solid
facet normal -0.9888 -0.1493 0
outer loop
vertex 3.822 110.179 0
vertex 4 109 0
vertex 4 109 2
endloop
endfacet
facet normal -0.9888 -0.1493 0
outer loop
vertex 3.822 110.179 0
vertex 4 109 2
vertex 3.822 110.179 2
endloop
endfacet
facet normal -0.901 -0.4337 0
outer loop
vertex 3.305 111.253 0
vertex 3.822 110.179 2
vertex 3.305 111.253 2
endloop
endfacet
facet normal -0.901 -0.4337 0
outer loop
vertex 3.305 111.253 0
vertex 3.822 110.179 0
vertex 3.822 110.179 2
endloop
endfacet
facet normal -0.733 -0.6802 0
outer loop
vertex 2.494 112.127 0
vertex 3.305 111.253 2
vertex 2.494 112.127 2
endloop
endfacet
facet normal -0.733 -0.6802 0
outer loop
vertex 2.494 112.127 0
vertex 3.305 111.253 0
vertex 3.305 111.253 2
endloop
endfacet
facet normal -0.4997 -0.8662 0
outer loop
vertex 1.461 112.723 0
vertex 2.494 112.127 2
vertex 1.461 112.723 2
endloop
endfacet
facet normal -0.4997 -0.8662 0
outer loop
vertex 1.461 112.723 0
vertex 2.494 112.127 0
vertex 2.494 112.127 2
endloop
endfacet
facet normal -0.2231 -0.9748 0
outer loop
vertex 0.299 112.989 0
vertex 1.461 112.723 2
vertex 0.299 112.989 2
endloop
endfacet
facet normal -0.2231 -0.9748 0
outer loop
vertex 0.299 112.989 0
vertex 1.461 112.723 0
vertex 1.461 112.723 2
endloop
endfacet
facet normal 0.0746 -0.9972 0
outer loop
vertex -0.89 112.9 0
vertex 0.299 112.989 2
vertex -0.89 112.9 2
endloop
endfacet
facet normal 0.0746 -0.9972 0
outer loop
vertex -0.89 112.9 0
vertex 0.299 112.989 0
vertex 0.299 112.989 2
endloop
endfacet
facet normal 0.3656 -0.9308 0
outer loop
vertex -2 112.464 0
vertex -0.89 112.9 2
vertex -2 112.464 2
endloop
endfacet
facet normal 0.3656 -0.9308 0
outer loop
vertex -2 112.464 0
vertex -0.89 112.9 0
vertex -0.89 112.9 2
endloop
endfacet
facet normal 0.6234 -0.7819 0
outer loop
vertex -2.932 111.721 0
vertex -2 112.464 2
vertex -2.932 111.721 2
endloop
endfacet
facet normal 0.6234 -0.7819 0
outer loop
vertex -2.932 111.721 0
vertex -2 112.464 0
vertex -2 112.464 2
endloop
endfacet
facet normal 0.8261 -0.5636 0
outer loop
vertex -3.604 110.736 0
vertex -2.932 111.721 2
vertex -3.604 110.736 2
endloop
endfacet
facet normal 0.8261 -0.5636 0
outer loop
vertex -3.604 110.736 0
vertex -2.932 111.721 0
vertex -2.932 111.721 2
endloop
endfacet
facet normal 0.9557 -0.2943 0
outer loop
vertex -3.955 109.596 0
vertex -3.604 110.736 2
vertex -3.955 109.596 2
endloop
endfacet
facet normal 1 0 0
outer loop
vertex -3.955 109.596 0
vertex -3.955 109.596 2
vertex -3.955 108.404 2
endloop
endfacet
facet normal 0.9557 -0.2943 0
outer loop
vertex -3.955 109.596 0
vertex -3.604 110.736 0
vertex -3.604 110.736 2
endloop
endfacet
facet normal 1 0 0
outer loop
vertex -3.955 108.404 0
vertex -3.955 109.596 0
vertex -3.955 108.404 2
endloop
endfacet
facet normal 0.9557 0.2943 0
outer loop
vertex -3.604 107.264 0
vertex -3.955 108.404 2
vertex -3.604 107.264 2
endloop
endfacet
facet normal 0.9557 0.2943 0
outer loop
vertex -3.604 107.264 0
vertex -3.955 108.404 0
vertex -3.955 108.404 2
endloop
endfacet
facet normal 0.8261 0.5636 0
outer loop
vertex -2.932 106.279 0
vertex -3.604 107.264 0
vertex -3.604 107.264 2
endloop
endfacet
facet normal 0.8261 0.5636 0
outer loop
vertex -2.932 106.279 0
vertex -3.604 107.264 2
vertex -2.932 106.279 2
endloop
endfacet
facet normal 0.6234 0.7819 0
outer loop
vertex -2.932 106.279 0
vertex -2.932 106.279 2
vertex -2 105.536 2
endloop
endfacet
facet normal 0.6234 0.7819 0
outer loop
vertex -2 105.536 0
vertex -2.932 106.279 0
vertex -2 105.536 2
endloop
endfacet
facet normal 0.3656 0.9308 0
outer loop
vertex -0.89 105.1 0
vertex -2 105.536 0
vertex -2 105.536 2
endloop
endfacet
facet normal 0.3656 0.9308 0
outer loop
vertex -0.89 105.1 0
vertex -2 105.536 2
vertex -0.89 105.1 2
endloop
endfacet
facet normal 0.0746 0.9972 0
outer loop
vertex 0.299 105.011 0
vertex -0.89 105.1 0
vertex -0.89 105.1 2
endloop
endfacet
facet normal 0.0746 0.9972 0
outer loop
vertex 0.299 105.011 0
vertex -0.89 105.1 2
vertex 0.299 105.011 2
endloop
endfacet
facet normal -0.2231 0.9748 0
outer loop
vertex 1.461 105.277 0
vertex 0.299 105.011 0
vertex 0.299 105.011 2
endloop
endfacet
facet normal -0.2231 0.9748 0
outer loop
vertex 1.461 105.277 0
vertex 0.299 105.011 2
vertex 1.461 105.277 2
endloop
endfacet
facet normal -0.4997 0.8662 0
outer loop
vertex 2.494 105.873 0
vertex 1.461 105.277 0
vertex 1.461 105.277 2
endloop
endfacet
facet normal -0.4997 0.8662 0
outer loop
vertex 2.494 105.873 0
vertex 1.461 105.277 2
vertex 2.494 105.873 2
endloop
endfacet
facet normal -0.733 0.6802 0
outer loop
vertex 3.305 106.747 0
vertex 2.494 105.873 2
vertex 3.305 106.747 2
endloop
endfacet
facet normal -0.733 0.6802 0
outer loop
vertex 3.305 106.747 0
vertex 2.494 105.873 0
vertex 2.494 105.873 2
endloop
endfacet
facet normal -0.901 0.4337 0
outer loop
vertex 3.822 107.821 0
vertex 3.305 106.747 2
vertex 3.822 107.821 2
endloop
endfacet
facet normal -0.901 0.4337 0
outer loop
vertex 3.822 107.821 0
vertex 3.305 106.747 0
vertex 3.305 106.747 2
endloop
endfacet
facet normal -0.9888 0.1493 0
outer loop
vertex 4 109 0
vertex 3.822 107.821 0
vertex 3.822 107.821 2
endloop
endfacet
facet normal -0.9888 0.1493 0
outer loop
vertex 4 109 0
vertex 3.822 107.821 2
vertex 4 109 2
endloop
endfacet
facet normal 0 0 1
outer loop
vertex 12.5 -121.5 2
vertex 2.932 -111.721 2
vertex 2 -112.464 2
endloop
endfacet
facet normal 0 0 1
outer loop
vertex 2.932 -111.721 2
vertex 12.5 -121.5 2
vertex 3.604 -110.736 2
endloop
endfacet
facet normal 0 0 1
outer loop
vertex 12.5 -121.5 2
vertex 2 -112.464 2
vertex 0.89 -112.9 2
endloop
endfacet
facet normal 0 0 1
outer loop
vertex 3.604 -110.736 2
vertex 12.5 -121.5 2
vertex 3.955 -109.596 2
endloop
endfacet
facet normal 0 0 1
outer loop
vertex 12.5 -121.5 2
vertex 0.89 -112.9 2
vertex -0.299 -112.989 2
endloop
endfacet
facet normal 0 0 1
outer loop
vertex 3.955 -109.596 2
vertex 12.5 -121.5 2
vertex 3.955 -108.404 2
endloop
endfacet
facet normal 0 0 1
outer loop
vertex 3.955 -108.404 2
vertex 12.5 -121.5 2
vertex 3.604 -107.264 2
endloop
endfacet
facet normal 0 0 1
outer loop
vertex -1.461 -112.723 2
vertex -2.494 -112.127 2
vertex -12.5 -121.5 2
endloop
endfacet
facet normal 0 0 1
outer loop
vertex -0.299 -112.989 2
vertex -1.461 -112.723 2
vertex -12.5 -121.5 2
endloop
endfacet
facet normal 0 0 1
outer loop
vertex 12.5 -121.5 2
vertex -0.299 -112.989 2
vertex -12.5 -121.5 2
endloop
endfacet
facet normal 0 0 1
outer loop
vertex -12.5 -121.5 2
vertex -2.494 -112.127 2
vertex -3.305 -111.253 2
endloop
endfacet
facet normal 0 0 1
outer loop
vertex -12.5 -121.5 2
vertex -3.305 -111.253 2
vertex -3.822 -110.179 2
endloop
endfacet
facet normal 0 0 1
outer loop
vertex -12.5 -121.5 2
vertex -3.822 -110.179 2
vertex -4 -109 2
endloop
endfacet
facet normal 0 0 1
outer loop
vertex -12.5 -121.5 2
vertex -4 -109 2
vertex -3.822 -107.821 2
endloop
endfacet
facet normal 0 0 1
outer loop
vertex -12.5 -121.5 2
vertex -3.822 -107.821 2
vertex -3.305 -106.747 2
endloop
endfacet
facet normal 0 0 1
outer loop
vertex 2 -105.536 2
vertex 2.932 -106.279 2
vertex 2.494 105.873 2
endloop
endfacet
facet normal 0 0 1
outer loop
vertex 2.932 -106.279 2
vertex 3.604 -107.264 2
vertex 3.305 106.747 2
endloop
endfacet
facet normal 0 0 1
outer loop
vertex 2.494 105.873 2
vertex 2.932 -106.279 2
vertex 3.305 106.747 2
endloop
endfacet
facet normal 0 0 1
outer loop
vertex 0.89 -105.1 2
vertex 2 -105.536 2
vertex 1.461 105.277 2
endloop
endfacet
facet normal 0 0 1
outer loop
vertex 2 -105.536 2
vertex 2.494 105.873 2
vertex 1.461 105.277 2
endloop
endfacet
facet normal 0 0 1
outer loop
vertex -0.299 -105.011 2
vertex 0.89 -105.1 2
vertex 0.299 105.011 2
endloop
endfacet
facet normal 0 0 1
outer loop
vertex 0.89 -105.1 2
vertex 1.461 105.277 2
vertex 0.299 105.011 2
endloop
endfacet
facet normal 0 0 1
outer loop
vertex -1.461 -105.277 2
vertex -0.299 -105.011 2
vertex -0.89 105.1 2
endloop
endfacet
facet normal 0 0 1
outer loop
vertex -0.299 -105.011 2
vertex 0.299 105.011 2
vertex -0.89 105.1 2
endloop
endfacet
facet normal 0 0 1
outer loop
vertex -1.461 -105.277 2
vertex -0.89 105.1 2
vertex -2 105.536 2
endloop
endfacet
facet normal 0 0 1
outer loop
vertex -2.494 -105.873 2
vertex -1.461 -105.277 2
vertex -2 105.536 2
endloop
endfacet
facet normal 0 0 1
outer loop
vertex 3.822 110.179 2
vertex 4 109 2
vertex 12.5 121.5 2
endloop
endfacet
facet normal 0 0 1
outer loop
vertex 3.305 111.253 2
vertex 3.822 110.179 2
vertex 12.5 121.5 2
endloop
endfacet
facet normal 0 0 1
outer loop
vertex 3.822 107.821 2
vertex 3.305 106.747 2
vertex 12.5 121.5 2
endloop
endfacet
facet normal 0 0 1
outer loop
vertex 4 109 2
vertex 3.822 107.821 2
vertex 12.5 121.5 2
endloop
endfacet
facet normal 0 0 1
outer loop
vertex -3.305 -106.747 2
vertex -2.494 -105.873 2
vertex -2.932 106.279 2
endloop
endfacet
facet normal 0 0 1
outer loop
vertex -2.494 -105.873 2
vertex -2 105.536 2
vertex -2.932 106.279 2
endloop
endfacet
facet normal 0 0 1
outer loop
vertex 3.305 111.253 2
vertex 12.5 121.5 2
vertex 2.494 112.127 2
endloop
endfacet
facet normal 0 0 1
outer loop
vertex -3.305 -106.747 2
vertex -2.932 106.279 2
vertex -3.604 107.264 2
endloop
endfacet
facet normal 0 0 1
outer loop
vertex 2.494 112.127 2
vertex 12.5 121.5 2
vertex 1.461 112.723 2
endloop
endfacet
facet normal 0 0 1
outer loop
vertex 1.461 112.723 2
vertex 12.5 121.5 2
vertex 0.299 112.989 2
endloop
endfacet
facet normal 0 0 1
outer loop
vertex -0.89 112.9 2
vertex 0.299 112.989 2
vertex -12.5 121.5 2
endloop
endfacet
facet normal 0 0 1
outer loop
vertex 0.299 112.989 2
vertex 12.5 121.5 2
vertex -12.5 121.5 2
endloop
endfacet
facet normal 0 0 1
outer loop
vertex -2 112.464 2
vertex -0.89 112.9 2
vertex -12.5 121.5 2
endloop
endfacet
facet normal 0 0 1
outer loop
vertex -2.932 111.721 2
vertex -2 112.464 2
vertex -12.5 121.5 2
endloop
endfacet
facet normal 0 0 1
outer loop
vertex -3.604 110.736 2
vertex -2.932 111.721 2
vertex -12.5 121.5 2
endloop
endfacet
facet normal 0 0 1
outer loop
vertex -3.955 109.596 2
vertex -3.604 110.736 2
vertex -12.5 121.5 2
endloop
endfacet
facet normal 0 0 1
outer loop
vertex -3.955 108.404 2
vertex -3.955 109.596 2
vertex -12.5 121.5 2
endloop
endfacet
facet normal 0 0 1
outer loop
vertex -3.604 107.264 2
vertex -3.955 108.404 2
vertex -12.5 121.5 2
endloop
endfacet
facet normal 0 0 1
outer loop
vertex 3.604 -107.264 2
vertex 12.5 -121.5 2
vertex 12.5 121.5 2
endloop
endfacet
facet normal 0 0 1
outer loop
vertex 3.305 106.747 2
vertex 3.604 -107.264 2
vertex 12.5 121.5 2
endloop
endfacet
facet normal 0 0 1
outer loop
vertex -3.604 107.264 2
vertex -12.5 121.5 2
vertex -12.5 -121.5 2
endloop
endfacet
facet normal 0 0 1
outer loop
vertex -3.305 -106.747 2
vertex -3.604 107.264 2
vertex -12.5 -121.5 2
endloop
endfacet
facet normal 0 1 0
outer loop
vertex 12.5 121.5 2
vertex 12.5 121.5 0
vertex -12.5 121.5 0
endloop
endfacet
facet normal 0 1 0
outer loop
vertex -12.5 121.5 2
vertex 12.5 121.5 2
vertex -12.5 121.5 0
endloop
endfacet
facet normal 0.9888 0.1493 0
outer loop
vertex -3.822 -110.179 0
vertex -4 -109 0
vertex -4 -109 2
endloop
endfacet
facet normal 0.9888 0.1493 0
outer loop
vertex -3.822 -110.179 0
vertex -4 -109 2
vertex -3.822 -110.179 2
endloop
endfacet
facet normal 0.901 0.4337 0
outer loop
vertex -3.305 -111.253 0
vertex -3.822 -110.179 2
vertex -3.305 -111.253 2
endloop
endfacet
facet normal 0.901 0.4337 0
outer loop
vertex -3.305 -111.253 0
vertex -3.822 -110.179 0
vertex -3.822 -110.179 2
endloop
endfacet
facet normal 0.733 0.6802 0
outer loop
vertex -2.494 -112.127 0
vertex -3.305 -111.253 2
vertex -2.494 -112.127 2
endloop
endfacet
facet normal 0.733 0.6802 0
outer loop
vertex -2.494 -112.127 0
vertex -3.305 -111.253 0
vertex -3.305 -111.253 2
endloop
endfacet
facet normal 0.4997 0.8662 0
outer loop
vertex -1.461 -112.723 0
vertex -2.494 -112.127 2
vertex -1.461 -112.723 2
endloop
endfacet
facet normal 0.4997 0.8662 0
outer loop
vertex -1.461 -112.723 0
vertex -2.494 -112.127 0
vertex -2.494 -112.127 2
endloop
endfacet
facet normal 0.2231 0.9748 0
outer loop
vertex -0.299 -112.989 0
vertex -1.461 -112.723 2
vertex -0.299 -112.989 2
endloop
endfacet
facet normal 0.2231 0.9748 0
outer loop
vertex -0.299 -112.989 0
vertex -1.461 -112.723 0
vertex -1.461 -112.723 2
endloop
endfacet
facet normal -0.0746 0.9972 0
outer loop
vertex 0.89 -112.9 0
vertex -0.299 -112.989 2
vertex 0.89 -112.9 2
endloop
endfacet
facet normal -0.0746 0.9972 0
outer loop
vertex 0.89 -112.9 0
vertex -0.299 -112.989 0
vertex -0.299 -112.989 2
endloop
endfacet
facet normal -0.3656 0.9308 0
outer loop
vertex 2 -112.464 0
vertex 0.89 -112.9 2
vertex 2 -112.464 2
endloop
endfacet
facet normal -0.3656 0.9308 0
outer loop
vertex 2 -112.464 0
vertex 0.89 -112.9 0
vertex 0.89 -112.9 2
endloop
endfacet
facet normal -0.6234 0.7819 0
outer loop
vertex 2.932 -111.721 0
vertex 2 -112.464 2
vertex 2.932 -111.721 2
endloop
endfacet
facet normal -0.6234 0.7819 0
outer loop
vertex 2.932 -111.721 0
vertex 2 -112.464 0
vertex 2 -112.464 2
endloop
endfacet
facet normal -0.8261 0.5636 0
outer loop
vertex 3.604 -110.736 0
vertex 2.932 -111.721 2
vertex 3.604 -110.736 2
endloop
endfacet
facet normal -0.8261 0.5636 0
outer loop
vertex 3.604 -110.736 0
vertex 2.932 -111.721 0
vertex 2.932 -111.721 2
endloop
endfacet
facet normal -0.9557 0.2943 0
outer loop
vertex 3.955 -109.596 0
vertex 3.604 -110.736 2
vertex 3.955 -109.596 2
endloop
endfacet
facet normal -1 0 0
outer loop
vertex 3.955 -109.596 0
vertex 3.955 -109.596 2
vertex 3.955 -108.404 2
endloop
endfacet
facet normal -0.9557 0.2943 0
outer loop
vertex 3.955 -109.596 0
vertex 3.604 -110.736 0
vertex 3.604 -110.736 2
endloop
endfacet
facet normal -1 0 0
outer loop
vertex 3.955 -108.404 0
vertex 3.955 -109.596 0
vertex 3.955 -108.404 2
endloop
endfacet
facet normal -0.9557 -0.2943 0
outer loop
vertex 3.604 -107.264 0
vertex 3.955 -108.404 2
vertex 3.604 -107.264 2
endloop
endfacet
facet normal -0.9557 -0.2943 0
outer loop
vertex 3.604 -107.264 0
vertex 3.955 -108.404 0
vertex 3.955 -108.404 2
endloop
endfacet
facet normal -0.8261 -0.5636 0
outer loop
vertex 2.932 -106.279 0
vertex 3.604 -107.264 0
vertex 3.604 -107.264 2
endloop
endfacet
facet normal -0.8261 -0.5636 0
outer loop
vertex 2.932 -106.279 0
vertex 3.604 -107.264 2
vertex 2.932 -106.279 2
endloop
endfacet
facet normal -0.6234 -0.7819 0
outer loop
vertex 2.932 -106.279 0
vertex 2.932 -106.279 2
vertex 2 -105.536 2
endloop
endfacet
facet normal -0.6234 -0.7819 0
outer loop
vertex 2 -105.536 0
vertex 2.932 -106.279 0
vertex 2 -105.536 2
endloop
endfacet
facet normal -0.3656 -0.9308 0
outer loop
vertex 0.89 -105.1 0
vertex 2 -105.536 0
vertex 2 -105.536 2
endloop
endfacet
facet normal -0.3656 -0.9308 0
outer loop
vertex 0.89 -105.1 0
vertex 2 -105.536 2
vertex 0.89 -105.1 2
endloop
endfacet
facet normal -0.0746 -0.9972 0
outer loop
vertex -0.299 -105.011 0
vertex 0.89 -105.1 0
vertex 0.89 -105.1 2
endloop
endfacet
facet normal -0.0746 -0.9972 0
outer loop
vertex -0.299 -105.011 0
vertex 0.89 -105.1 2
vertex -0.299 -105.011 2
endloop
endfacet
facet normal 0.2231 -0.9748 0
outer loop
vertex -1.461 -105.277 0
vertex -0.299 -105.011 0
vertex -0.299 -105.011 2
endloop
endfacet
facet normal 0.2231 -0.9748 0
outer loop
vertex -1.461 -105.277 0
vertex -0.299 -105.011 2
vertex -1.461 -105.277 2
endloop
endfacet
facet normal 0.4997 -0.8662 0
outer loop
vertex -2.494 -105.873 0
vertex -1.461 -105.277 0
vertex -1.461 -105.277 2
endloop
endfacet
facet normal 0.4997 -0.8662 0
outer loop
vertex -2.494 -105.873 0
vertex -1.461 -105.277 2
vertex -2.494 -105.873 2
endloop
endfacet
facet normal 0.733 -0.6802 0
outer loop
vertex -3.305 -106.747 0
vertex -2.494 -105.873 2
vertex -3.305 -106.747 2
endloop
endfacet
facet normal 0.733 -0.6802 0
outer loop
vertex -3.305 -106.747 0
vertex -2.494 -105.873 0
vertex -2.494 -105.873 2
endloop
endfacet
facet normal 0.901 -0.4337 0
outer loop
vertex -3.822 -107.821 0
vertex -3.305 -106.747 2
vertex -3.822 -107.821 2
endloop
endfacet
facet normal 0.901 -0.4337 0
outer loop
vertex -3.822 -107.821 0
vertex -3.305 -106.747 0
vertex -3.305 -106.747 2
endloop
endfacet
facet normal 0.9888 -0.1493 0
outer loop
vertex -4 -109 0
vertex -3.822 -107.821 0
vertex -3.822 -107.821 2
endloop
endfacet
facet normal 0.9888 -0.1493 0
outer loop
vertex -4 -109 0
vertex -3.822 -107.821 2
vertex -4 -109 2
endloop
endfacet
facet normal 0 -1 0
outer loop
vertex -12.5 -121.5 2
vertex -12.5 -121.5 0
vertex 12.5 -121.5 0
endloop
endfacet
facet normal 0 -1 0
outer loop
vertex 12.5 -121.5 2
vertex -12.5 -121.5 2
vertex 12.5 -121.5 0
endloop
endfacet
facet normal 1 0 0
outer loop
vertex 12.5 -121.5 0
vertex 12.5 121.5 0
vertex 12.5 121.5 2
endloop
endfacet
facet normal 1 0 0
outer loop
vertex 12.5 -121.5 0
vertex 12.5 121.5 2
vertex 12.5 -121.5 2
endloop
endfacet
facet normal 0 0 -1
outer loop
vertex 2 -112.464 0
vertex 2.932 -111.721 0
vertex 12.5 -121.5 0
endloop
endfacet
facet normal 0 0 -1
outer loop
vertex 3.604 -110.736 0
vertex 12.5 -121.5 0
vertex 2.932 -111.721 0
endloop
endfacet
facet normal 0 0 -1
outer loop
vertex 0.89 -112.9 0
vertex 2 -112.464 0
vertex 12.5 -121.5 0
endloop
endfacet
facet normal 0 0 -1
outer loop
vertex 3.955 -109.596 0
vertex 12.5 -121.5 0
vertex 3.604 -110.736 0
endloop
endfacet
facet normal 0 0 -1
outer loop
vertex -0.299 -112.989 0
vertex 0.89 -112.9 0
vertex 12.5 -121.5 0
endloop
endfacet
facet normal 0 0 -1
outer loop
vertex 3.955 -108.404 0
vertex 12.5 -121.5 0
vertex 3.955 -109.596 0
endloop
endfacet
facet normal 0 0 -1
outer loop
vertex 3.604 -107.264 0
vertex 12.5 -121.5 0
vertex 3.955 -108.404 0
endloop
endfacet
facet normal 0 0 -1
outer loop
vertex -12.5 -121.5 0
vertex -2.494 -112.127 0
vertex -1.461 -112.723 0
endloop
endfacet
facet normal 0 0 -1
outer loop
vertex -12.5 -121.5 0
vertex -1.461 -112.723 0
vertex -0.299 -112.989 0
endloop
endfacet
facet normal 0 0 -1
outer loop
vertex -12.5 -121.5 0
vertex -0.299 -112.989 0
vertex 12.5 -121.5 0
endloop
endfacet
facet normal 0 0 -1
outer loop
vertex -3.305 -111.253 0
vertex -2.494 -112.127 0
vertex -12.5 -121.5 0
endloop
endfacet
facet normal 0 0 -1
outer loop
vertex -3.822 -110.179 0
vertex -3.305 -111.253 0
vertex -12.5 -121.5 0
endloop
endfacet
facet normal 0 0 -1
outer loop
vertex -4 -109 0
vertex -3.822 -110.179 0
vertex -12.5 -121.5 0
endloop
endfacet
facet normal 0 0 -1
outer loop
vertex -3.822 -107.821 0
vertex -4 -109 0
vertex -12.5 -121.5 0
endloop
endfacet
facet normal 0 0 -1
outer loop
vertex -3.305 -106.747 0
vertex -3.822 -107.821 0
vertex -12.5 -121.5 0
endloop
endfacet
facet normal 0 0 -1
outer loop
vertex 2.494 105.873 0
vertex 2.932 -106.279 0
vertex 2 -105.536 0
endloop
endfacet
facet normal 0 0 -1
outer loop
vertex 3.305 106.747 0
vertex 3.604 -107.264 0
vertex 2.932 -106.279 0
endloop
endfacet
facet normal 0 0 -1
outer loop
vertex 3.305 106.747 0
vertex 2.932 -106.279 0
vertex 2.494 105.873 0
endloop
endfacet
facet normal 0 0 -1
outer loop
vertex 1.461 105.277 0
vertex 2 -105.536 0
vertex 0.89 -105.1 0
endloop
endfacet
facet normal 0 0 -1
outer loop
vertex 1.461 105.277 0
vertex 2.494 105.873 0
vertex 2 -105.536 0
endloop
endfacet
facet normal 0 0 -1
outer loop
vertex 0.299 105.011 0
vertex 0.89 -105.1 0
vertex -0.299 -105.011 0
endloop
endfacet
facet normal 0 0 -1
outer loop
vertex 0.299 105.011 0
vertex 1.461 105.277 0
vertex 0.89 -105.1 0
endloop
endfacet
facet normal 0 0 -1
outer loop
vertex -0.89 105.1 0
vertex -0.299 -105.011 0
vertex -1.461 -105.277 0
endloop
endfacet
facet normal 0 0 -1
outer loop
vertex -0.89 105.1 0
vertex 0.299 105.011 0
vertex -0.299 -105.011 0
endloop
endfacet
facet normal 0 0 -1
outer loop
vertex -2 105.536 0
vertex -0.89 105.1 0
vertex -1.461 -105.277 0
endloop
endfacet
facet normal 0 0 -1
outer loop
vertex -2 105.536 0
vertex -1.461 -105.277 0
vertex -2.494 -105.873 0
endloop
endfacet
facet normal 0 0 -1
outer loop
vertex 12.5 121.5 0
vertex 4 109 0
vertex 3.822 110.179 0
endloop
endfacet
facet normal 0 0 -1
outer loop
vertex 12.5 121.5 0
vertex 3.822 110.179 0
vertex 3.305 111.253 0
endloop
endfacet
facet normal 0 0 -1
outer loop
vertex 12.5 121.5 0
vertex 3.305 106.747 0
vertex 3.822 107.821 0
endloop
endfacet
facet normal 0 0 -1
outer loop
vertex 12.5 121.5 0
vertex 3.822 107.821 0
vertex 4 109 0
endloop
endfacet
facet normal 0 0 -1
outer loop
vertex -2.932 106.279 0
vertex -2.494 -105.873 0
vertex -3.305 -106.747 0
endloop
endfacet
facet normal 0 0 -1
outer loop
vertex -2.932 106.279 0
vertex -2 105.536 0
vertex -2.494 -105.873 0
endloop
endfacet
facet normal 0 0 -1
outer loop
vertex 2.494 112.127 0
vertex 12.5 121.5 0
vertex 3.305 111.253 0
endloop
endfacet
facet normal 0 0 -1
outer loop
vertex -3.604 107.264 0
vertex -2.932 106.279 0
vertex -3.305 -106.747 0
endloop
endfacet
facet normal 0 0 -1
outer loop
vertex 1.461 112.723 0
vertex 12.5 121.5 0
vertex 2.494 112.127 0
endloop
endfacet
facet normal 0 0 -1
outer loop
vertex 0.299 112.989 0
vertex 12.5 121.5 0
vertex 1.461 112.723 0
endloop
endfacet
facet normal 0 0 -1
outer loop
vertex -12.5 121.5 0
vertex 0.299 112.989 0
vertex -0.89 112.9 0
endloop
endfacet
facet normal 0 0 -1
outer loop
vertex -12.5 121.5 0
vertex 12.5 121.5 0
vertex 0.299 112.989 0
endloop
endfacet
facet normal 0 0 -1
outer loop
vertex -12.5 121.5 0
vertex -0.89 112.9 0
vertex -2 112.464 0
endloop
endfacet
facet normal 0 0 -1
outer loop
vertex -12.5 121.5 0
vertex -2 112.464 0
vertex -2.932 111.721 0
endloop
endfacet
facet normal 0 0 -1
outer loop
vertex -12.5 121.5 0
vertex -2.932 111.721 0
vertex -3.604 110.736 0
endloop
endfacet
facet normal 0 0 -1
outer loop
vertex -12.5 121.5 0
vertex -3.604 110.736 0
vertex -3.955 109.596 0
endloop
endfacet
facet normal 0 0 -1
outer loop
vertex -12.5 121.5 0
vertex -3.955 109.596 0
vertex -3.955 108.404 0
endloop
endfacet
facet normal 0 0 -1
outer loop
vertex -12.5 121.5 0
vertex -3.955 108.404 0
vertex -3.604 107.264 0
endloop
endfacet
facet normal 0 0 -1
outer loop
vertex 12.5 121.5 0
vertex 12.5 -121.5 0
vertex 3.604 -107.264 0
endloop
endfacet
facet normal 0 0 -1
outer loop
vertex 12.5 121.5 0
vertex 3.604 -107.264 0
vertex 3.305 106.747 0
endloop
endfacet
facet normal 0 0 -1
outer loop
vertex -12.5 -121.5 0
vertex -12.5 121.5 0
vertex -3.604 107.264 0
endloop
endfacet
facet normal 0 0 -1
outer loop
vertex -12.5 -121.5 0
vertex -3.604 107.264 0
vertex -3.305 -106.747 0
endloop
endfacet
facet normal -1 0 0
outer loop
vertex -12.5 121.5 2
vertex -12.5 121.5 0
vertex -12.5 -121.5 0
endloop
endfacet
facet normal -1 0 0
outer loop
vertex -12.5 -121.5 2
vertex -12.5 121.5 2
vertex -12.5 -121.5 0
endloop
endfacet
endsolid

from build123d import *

# Parameters (mm, degrees)
SKETCH1_R           = 4
BOSS_EXTRUDE1_DEPTH = 2


with BuildPart() as part:
    # Sketch1 → Boss-Extrude1 (new body)
    with BuildSketch(Plane.XY):
        Polygon((3.5, 121.5), (12.5, 121.5), (12.5, -121.5), (3.5, -121.5), (0, -121.5), (-12.5, -121.5), (-12.5, -115.487492178), (-12.5, -105.5), (-12.5, 112.5), (-12.5, 121.482064427), (-12.5, 121.5), (0, 121.5), align=None)
        with Locations((0, 109)):
            Circle(SKETCH1_R, mode=Mode.SUBTRACT)
        with Locations(Location((0, -109, 0), (0, 0, 180))):
            Circle(SKETCH1_R, mode=Mode.SUBTRACT)
    extrude(amount=BOSS_EXTRUDE1_DEPTH)


solid = part.part
